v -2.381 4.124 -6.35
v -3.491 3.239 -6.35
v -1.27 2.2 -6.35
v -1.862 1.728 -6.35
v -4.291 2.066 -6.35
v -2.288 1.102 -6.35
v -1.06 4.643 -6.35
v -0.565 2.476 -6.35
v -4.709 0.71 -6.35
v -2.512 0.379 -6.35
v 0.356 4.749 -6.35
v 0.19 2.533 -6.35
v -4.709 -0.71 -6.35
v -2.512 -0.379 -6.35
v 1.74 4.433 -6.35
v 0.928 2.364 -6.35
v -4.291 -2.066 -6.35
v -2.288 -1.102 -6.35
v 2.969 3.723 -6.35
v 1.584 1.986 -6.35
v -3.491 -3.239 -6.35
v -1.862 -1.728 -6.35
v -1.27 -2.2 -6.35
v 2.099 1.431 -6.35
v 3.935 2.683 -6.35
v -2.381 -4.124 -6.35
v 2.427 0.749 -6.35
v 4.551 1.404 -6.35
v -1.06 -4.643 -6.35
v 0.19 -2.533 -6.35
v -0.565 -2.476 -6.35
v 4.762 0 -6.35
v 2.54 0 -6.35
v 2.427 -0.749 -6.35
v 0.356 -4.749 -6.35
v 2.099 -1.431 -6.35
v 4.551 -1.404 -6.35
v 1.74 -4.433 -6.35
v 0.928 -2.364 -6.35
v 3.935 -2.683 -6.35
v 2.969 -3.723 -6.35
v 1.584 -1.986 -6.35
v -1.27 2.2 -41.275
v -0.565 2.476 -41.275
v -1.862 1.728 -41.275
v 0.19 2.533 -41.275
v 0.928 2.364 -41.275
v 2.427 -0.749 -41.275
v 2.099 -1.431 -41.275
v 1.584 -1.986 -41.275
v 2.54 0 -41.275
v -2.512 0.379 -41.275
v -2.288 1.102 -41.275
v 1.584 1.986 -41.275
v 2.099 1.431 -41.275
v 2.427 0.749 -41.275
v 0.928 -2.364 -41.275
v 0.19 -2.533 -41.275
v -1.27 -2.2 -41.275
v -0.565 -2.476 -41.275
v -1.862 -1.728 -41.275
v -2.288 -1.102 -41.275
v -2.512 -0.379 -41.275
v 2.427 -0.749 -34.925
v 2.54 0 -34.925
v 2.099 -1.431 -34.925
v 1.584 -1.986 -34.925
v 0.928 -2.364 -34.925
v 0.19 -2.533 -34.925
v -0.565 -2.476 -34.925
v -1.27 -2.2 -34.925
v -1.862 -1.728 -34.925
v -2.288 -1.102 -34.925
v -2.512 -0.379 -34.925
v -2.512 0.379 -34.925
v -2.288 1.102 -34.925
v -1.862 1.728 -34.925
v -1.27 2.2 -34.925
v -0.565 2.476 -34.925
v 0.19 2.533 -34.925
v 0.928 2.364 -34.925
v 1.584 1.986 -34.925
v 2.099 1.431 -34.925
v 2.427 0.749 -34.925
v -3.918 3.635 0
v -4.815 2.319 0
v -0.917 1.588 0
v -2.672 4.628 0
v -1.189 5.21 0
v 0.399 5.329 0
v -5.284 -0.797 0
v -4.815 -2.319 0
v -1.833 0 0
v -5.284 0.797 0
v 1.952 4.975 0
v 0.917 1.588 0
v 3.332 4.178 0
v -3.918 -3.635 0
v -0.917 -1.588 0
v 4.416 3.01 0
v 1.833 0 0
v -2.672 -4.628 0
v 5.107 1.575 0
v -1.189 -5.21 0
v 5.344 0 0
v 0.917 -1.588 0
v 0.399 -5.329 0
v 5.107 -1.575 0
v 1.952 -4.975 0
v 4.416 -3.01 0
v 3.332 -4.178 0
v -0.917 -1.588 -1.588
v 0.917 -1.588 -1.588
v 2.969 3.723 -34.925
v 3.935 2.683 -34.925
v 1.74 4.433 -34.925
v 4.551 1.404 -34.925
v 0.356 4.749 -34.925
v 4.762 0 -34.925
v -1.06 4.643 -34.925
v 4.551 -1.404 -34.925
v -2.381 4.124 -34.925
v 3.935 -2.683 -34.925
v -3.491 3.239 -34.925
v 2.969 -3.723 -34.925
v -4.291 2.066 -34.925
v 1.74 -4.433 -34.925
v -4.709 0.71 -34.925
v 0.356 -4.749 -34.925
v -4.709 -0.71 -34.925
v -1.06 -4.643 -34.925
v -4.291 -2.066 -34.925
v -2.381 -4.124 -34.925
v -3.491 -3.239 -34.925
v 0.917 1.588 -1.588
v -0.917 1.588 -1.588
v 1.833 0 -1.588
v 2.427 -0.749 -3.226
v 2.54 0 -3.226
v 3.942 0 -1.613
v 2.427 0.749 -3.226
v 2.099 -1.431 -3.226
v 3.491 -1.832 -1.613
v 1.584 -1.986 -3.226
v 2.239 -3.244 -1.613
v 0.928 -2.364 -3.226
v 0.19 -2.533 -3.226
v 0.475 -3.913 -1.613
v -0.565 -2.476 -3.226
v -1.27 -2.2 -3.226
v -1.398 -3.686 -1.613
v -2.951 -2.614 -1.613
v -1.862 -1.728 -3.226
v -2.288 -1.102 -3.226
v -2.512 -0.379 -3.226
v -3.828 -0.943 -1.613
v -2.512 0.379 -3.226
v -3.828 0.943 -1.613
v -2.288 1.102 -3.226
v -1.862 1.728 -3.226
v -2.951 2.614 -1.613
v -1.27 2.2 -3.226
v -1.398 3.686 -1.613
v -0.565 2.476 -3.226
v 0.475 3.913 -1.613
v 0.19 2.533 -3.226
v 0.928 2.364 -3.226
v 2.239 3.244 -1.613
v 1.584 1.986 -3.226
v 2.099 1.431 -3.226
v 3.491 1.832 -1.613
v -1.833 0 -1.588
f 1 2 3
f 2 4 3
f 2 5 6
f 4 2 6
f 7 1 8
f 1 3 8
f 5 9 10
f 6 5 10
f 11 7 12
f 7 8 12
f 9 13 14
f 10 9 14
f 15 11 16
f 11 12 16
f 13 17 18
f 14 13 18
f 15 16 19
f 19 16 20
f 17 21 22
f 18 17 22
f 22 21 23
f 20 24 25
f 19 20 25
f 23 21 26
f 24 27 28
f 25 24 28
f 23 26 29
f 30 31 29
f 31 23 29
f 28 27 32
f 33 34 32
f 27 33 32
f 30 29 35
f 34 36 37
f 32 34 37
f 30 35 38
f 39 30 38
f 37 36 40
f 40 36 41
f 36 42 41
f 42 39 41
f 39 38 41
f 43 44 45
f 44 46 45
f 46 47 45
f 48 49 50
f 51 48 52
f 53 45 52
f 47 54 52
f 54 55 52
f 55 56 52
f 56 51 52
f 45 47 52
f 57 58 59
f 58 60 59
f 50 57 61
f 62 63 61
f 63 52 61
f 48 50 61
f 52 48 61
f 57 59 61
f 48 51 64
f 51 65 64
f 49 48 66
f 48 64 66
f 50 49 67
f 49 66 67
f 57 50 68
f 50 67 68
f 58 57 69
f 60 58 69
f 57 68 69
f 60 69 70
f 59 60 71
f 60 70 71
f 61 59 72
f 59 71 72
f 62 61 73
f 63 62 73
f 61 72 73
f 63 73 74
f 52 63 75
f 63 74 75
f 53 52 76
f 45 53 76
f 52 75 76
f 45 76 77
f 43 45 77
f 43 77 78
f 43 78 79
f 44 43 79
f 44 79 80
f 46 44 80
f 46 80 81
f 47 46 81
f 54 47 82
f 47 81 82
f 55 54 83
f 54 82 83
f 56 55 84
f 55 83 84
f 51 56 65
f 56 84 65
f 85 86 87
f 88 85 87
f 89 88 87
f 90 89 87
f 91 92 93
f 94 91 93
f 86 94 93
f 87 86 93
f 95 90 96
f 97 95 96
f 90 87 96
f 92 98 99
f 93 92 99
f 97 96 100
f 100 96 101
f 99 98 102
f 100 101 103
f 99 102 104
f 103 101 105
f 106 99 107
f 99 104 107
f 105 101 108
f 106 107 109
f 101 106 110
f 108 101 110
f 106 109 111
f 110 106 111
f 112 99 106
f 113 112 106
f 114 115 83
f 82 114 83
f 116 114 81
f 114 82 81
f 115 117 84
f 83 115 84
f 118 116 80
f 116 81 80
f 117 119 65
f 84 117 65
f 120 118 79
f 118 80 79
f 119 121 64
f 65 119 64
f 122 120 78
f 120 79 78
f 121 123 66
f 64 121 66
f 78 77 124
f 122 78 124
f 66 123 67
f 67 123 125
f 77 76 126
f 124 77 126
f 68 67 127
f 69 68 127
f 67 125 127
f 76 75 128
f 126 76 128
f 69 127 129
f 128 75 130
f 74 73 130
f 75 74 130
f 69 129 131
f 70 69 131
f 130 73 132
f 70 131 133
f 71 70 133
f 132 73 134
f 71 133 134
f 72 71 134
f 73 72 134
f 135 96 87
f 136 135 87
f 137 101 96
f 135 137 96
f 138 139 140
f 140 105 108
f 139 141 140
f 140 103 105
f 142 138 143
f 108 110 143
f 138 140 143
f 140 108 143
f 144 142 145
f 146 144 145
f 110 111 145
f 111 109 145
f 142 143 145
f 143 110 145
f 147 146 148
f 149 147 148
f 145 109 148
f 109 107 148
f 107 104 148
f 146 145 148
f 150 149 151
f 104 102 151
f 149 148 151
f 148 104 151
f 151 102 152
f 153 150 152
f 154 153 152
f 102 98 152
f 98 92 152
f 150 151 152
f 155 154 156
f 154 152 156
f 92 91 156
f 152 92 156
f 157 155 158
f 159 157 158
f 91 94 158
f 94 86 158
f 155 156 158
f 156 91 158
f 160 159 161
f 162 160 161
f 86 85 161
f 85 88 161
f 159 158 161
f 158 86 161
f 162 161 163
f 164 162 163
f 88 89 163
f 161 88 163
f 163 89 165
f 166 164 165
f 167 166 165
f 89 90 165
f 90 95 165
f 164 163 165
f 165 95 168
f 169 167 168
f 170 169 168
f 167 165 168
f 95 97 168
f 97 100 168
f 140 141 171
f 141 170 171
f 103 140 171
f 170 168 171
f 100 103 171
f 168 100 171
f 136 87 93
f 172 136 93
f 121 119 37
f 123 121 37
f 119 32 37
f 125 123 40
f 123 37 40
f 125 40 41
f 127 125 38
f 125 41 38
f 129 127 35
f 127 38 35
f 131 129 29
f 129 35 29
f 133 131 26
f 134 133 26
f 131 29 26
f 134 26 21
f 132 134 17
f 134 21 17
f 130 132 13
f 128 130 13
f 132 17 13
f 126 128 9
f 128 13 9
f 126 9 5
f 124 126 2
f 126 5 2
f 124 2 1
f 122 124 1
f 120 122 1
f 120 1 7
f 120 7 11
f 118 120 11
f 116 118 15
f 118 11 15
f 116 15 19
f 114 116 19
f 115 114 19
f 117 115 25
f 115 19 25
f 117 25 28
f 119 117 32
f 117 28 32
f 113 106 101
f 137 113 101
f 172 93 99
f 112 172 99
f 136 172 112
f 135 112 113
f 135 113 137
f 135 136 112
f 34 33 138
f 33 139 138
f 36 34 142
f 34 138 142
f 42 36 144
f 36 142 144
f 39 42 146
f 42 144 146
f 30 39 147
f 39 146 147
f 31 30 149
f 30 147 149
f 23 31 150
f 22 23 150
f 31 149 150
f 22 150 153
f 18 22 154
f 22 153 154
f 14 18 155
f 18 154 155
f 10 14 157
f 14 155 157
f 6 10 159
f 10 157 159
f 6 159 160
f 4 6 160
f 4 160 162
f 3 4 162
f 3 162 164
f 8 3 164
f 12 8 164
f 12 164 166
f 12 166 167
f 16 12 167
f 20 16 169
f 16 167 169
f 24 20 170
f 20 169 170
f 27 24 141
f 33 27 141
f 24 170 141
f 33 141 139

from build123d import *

# Parameters (mm, degrees)
F3_DEPTH = 1.5875


with BuildPart() as f1:
    # F0 (on Front) → F1 (revolve)
    with BuildSketch(Plane.XZ):
        Polygon((5.3441451588, 0), (0, 0), (0, -3.2258), (0, -41.275), (2.54, -41.275), (2.54, -34.925), (4.7625, -34.925), (4.7625, -6.35), (2.54, -6.35), (2.54, -3.2258), align=None)
    revolve(axis=Axis((0, 0, -22.2504), (0, 0, -1)))

    # F2 (on face) → F3 (cut)
    with BuildSketch(Plane.XY):
        Polygon((0.9165435523, 1.5875), (-0.9165435523, 1.5875), (-1.8330871047, 0), (-0.9165435523, -1.5875), (0.9165435523, -1.5875), (1.8330871047, 0), align=None)
    extrude(amount=-F3_DEPTH, mode=Mode.SUBTRACT)


solid = f1.part
